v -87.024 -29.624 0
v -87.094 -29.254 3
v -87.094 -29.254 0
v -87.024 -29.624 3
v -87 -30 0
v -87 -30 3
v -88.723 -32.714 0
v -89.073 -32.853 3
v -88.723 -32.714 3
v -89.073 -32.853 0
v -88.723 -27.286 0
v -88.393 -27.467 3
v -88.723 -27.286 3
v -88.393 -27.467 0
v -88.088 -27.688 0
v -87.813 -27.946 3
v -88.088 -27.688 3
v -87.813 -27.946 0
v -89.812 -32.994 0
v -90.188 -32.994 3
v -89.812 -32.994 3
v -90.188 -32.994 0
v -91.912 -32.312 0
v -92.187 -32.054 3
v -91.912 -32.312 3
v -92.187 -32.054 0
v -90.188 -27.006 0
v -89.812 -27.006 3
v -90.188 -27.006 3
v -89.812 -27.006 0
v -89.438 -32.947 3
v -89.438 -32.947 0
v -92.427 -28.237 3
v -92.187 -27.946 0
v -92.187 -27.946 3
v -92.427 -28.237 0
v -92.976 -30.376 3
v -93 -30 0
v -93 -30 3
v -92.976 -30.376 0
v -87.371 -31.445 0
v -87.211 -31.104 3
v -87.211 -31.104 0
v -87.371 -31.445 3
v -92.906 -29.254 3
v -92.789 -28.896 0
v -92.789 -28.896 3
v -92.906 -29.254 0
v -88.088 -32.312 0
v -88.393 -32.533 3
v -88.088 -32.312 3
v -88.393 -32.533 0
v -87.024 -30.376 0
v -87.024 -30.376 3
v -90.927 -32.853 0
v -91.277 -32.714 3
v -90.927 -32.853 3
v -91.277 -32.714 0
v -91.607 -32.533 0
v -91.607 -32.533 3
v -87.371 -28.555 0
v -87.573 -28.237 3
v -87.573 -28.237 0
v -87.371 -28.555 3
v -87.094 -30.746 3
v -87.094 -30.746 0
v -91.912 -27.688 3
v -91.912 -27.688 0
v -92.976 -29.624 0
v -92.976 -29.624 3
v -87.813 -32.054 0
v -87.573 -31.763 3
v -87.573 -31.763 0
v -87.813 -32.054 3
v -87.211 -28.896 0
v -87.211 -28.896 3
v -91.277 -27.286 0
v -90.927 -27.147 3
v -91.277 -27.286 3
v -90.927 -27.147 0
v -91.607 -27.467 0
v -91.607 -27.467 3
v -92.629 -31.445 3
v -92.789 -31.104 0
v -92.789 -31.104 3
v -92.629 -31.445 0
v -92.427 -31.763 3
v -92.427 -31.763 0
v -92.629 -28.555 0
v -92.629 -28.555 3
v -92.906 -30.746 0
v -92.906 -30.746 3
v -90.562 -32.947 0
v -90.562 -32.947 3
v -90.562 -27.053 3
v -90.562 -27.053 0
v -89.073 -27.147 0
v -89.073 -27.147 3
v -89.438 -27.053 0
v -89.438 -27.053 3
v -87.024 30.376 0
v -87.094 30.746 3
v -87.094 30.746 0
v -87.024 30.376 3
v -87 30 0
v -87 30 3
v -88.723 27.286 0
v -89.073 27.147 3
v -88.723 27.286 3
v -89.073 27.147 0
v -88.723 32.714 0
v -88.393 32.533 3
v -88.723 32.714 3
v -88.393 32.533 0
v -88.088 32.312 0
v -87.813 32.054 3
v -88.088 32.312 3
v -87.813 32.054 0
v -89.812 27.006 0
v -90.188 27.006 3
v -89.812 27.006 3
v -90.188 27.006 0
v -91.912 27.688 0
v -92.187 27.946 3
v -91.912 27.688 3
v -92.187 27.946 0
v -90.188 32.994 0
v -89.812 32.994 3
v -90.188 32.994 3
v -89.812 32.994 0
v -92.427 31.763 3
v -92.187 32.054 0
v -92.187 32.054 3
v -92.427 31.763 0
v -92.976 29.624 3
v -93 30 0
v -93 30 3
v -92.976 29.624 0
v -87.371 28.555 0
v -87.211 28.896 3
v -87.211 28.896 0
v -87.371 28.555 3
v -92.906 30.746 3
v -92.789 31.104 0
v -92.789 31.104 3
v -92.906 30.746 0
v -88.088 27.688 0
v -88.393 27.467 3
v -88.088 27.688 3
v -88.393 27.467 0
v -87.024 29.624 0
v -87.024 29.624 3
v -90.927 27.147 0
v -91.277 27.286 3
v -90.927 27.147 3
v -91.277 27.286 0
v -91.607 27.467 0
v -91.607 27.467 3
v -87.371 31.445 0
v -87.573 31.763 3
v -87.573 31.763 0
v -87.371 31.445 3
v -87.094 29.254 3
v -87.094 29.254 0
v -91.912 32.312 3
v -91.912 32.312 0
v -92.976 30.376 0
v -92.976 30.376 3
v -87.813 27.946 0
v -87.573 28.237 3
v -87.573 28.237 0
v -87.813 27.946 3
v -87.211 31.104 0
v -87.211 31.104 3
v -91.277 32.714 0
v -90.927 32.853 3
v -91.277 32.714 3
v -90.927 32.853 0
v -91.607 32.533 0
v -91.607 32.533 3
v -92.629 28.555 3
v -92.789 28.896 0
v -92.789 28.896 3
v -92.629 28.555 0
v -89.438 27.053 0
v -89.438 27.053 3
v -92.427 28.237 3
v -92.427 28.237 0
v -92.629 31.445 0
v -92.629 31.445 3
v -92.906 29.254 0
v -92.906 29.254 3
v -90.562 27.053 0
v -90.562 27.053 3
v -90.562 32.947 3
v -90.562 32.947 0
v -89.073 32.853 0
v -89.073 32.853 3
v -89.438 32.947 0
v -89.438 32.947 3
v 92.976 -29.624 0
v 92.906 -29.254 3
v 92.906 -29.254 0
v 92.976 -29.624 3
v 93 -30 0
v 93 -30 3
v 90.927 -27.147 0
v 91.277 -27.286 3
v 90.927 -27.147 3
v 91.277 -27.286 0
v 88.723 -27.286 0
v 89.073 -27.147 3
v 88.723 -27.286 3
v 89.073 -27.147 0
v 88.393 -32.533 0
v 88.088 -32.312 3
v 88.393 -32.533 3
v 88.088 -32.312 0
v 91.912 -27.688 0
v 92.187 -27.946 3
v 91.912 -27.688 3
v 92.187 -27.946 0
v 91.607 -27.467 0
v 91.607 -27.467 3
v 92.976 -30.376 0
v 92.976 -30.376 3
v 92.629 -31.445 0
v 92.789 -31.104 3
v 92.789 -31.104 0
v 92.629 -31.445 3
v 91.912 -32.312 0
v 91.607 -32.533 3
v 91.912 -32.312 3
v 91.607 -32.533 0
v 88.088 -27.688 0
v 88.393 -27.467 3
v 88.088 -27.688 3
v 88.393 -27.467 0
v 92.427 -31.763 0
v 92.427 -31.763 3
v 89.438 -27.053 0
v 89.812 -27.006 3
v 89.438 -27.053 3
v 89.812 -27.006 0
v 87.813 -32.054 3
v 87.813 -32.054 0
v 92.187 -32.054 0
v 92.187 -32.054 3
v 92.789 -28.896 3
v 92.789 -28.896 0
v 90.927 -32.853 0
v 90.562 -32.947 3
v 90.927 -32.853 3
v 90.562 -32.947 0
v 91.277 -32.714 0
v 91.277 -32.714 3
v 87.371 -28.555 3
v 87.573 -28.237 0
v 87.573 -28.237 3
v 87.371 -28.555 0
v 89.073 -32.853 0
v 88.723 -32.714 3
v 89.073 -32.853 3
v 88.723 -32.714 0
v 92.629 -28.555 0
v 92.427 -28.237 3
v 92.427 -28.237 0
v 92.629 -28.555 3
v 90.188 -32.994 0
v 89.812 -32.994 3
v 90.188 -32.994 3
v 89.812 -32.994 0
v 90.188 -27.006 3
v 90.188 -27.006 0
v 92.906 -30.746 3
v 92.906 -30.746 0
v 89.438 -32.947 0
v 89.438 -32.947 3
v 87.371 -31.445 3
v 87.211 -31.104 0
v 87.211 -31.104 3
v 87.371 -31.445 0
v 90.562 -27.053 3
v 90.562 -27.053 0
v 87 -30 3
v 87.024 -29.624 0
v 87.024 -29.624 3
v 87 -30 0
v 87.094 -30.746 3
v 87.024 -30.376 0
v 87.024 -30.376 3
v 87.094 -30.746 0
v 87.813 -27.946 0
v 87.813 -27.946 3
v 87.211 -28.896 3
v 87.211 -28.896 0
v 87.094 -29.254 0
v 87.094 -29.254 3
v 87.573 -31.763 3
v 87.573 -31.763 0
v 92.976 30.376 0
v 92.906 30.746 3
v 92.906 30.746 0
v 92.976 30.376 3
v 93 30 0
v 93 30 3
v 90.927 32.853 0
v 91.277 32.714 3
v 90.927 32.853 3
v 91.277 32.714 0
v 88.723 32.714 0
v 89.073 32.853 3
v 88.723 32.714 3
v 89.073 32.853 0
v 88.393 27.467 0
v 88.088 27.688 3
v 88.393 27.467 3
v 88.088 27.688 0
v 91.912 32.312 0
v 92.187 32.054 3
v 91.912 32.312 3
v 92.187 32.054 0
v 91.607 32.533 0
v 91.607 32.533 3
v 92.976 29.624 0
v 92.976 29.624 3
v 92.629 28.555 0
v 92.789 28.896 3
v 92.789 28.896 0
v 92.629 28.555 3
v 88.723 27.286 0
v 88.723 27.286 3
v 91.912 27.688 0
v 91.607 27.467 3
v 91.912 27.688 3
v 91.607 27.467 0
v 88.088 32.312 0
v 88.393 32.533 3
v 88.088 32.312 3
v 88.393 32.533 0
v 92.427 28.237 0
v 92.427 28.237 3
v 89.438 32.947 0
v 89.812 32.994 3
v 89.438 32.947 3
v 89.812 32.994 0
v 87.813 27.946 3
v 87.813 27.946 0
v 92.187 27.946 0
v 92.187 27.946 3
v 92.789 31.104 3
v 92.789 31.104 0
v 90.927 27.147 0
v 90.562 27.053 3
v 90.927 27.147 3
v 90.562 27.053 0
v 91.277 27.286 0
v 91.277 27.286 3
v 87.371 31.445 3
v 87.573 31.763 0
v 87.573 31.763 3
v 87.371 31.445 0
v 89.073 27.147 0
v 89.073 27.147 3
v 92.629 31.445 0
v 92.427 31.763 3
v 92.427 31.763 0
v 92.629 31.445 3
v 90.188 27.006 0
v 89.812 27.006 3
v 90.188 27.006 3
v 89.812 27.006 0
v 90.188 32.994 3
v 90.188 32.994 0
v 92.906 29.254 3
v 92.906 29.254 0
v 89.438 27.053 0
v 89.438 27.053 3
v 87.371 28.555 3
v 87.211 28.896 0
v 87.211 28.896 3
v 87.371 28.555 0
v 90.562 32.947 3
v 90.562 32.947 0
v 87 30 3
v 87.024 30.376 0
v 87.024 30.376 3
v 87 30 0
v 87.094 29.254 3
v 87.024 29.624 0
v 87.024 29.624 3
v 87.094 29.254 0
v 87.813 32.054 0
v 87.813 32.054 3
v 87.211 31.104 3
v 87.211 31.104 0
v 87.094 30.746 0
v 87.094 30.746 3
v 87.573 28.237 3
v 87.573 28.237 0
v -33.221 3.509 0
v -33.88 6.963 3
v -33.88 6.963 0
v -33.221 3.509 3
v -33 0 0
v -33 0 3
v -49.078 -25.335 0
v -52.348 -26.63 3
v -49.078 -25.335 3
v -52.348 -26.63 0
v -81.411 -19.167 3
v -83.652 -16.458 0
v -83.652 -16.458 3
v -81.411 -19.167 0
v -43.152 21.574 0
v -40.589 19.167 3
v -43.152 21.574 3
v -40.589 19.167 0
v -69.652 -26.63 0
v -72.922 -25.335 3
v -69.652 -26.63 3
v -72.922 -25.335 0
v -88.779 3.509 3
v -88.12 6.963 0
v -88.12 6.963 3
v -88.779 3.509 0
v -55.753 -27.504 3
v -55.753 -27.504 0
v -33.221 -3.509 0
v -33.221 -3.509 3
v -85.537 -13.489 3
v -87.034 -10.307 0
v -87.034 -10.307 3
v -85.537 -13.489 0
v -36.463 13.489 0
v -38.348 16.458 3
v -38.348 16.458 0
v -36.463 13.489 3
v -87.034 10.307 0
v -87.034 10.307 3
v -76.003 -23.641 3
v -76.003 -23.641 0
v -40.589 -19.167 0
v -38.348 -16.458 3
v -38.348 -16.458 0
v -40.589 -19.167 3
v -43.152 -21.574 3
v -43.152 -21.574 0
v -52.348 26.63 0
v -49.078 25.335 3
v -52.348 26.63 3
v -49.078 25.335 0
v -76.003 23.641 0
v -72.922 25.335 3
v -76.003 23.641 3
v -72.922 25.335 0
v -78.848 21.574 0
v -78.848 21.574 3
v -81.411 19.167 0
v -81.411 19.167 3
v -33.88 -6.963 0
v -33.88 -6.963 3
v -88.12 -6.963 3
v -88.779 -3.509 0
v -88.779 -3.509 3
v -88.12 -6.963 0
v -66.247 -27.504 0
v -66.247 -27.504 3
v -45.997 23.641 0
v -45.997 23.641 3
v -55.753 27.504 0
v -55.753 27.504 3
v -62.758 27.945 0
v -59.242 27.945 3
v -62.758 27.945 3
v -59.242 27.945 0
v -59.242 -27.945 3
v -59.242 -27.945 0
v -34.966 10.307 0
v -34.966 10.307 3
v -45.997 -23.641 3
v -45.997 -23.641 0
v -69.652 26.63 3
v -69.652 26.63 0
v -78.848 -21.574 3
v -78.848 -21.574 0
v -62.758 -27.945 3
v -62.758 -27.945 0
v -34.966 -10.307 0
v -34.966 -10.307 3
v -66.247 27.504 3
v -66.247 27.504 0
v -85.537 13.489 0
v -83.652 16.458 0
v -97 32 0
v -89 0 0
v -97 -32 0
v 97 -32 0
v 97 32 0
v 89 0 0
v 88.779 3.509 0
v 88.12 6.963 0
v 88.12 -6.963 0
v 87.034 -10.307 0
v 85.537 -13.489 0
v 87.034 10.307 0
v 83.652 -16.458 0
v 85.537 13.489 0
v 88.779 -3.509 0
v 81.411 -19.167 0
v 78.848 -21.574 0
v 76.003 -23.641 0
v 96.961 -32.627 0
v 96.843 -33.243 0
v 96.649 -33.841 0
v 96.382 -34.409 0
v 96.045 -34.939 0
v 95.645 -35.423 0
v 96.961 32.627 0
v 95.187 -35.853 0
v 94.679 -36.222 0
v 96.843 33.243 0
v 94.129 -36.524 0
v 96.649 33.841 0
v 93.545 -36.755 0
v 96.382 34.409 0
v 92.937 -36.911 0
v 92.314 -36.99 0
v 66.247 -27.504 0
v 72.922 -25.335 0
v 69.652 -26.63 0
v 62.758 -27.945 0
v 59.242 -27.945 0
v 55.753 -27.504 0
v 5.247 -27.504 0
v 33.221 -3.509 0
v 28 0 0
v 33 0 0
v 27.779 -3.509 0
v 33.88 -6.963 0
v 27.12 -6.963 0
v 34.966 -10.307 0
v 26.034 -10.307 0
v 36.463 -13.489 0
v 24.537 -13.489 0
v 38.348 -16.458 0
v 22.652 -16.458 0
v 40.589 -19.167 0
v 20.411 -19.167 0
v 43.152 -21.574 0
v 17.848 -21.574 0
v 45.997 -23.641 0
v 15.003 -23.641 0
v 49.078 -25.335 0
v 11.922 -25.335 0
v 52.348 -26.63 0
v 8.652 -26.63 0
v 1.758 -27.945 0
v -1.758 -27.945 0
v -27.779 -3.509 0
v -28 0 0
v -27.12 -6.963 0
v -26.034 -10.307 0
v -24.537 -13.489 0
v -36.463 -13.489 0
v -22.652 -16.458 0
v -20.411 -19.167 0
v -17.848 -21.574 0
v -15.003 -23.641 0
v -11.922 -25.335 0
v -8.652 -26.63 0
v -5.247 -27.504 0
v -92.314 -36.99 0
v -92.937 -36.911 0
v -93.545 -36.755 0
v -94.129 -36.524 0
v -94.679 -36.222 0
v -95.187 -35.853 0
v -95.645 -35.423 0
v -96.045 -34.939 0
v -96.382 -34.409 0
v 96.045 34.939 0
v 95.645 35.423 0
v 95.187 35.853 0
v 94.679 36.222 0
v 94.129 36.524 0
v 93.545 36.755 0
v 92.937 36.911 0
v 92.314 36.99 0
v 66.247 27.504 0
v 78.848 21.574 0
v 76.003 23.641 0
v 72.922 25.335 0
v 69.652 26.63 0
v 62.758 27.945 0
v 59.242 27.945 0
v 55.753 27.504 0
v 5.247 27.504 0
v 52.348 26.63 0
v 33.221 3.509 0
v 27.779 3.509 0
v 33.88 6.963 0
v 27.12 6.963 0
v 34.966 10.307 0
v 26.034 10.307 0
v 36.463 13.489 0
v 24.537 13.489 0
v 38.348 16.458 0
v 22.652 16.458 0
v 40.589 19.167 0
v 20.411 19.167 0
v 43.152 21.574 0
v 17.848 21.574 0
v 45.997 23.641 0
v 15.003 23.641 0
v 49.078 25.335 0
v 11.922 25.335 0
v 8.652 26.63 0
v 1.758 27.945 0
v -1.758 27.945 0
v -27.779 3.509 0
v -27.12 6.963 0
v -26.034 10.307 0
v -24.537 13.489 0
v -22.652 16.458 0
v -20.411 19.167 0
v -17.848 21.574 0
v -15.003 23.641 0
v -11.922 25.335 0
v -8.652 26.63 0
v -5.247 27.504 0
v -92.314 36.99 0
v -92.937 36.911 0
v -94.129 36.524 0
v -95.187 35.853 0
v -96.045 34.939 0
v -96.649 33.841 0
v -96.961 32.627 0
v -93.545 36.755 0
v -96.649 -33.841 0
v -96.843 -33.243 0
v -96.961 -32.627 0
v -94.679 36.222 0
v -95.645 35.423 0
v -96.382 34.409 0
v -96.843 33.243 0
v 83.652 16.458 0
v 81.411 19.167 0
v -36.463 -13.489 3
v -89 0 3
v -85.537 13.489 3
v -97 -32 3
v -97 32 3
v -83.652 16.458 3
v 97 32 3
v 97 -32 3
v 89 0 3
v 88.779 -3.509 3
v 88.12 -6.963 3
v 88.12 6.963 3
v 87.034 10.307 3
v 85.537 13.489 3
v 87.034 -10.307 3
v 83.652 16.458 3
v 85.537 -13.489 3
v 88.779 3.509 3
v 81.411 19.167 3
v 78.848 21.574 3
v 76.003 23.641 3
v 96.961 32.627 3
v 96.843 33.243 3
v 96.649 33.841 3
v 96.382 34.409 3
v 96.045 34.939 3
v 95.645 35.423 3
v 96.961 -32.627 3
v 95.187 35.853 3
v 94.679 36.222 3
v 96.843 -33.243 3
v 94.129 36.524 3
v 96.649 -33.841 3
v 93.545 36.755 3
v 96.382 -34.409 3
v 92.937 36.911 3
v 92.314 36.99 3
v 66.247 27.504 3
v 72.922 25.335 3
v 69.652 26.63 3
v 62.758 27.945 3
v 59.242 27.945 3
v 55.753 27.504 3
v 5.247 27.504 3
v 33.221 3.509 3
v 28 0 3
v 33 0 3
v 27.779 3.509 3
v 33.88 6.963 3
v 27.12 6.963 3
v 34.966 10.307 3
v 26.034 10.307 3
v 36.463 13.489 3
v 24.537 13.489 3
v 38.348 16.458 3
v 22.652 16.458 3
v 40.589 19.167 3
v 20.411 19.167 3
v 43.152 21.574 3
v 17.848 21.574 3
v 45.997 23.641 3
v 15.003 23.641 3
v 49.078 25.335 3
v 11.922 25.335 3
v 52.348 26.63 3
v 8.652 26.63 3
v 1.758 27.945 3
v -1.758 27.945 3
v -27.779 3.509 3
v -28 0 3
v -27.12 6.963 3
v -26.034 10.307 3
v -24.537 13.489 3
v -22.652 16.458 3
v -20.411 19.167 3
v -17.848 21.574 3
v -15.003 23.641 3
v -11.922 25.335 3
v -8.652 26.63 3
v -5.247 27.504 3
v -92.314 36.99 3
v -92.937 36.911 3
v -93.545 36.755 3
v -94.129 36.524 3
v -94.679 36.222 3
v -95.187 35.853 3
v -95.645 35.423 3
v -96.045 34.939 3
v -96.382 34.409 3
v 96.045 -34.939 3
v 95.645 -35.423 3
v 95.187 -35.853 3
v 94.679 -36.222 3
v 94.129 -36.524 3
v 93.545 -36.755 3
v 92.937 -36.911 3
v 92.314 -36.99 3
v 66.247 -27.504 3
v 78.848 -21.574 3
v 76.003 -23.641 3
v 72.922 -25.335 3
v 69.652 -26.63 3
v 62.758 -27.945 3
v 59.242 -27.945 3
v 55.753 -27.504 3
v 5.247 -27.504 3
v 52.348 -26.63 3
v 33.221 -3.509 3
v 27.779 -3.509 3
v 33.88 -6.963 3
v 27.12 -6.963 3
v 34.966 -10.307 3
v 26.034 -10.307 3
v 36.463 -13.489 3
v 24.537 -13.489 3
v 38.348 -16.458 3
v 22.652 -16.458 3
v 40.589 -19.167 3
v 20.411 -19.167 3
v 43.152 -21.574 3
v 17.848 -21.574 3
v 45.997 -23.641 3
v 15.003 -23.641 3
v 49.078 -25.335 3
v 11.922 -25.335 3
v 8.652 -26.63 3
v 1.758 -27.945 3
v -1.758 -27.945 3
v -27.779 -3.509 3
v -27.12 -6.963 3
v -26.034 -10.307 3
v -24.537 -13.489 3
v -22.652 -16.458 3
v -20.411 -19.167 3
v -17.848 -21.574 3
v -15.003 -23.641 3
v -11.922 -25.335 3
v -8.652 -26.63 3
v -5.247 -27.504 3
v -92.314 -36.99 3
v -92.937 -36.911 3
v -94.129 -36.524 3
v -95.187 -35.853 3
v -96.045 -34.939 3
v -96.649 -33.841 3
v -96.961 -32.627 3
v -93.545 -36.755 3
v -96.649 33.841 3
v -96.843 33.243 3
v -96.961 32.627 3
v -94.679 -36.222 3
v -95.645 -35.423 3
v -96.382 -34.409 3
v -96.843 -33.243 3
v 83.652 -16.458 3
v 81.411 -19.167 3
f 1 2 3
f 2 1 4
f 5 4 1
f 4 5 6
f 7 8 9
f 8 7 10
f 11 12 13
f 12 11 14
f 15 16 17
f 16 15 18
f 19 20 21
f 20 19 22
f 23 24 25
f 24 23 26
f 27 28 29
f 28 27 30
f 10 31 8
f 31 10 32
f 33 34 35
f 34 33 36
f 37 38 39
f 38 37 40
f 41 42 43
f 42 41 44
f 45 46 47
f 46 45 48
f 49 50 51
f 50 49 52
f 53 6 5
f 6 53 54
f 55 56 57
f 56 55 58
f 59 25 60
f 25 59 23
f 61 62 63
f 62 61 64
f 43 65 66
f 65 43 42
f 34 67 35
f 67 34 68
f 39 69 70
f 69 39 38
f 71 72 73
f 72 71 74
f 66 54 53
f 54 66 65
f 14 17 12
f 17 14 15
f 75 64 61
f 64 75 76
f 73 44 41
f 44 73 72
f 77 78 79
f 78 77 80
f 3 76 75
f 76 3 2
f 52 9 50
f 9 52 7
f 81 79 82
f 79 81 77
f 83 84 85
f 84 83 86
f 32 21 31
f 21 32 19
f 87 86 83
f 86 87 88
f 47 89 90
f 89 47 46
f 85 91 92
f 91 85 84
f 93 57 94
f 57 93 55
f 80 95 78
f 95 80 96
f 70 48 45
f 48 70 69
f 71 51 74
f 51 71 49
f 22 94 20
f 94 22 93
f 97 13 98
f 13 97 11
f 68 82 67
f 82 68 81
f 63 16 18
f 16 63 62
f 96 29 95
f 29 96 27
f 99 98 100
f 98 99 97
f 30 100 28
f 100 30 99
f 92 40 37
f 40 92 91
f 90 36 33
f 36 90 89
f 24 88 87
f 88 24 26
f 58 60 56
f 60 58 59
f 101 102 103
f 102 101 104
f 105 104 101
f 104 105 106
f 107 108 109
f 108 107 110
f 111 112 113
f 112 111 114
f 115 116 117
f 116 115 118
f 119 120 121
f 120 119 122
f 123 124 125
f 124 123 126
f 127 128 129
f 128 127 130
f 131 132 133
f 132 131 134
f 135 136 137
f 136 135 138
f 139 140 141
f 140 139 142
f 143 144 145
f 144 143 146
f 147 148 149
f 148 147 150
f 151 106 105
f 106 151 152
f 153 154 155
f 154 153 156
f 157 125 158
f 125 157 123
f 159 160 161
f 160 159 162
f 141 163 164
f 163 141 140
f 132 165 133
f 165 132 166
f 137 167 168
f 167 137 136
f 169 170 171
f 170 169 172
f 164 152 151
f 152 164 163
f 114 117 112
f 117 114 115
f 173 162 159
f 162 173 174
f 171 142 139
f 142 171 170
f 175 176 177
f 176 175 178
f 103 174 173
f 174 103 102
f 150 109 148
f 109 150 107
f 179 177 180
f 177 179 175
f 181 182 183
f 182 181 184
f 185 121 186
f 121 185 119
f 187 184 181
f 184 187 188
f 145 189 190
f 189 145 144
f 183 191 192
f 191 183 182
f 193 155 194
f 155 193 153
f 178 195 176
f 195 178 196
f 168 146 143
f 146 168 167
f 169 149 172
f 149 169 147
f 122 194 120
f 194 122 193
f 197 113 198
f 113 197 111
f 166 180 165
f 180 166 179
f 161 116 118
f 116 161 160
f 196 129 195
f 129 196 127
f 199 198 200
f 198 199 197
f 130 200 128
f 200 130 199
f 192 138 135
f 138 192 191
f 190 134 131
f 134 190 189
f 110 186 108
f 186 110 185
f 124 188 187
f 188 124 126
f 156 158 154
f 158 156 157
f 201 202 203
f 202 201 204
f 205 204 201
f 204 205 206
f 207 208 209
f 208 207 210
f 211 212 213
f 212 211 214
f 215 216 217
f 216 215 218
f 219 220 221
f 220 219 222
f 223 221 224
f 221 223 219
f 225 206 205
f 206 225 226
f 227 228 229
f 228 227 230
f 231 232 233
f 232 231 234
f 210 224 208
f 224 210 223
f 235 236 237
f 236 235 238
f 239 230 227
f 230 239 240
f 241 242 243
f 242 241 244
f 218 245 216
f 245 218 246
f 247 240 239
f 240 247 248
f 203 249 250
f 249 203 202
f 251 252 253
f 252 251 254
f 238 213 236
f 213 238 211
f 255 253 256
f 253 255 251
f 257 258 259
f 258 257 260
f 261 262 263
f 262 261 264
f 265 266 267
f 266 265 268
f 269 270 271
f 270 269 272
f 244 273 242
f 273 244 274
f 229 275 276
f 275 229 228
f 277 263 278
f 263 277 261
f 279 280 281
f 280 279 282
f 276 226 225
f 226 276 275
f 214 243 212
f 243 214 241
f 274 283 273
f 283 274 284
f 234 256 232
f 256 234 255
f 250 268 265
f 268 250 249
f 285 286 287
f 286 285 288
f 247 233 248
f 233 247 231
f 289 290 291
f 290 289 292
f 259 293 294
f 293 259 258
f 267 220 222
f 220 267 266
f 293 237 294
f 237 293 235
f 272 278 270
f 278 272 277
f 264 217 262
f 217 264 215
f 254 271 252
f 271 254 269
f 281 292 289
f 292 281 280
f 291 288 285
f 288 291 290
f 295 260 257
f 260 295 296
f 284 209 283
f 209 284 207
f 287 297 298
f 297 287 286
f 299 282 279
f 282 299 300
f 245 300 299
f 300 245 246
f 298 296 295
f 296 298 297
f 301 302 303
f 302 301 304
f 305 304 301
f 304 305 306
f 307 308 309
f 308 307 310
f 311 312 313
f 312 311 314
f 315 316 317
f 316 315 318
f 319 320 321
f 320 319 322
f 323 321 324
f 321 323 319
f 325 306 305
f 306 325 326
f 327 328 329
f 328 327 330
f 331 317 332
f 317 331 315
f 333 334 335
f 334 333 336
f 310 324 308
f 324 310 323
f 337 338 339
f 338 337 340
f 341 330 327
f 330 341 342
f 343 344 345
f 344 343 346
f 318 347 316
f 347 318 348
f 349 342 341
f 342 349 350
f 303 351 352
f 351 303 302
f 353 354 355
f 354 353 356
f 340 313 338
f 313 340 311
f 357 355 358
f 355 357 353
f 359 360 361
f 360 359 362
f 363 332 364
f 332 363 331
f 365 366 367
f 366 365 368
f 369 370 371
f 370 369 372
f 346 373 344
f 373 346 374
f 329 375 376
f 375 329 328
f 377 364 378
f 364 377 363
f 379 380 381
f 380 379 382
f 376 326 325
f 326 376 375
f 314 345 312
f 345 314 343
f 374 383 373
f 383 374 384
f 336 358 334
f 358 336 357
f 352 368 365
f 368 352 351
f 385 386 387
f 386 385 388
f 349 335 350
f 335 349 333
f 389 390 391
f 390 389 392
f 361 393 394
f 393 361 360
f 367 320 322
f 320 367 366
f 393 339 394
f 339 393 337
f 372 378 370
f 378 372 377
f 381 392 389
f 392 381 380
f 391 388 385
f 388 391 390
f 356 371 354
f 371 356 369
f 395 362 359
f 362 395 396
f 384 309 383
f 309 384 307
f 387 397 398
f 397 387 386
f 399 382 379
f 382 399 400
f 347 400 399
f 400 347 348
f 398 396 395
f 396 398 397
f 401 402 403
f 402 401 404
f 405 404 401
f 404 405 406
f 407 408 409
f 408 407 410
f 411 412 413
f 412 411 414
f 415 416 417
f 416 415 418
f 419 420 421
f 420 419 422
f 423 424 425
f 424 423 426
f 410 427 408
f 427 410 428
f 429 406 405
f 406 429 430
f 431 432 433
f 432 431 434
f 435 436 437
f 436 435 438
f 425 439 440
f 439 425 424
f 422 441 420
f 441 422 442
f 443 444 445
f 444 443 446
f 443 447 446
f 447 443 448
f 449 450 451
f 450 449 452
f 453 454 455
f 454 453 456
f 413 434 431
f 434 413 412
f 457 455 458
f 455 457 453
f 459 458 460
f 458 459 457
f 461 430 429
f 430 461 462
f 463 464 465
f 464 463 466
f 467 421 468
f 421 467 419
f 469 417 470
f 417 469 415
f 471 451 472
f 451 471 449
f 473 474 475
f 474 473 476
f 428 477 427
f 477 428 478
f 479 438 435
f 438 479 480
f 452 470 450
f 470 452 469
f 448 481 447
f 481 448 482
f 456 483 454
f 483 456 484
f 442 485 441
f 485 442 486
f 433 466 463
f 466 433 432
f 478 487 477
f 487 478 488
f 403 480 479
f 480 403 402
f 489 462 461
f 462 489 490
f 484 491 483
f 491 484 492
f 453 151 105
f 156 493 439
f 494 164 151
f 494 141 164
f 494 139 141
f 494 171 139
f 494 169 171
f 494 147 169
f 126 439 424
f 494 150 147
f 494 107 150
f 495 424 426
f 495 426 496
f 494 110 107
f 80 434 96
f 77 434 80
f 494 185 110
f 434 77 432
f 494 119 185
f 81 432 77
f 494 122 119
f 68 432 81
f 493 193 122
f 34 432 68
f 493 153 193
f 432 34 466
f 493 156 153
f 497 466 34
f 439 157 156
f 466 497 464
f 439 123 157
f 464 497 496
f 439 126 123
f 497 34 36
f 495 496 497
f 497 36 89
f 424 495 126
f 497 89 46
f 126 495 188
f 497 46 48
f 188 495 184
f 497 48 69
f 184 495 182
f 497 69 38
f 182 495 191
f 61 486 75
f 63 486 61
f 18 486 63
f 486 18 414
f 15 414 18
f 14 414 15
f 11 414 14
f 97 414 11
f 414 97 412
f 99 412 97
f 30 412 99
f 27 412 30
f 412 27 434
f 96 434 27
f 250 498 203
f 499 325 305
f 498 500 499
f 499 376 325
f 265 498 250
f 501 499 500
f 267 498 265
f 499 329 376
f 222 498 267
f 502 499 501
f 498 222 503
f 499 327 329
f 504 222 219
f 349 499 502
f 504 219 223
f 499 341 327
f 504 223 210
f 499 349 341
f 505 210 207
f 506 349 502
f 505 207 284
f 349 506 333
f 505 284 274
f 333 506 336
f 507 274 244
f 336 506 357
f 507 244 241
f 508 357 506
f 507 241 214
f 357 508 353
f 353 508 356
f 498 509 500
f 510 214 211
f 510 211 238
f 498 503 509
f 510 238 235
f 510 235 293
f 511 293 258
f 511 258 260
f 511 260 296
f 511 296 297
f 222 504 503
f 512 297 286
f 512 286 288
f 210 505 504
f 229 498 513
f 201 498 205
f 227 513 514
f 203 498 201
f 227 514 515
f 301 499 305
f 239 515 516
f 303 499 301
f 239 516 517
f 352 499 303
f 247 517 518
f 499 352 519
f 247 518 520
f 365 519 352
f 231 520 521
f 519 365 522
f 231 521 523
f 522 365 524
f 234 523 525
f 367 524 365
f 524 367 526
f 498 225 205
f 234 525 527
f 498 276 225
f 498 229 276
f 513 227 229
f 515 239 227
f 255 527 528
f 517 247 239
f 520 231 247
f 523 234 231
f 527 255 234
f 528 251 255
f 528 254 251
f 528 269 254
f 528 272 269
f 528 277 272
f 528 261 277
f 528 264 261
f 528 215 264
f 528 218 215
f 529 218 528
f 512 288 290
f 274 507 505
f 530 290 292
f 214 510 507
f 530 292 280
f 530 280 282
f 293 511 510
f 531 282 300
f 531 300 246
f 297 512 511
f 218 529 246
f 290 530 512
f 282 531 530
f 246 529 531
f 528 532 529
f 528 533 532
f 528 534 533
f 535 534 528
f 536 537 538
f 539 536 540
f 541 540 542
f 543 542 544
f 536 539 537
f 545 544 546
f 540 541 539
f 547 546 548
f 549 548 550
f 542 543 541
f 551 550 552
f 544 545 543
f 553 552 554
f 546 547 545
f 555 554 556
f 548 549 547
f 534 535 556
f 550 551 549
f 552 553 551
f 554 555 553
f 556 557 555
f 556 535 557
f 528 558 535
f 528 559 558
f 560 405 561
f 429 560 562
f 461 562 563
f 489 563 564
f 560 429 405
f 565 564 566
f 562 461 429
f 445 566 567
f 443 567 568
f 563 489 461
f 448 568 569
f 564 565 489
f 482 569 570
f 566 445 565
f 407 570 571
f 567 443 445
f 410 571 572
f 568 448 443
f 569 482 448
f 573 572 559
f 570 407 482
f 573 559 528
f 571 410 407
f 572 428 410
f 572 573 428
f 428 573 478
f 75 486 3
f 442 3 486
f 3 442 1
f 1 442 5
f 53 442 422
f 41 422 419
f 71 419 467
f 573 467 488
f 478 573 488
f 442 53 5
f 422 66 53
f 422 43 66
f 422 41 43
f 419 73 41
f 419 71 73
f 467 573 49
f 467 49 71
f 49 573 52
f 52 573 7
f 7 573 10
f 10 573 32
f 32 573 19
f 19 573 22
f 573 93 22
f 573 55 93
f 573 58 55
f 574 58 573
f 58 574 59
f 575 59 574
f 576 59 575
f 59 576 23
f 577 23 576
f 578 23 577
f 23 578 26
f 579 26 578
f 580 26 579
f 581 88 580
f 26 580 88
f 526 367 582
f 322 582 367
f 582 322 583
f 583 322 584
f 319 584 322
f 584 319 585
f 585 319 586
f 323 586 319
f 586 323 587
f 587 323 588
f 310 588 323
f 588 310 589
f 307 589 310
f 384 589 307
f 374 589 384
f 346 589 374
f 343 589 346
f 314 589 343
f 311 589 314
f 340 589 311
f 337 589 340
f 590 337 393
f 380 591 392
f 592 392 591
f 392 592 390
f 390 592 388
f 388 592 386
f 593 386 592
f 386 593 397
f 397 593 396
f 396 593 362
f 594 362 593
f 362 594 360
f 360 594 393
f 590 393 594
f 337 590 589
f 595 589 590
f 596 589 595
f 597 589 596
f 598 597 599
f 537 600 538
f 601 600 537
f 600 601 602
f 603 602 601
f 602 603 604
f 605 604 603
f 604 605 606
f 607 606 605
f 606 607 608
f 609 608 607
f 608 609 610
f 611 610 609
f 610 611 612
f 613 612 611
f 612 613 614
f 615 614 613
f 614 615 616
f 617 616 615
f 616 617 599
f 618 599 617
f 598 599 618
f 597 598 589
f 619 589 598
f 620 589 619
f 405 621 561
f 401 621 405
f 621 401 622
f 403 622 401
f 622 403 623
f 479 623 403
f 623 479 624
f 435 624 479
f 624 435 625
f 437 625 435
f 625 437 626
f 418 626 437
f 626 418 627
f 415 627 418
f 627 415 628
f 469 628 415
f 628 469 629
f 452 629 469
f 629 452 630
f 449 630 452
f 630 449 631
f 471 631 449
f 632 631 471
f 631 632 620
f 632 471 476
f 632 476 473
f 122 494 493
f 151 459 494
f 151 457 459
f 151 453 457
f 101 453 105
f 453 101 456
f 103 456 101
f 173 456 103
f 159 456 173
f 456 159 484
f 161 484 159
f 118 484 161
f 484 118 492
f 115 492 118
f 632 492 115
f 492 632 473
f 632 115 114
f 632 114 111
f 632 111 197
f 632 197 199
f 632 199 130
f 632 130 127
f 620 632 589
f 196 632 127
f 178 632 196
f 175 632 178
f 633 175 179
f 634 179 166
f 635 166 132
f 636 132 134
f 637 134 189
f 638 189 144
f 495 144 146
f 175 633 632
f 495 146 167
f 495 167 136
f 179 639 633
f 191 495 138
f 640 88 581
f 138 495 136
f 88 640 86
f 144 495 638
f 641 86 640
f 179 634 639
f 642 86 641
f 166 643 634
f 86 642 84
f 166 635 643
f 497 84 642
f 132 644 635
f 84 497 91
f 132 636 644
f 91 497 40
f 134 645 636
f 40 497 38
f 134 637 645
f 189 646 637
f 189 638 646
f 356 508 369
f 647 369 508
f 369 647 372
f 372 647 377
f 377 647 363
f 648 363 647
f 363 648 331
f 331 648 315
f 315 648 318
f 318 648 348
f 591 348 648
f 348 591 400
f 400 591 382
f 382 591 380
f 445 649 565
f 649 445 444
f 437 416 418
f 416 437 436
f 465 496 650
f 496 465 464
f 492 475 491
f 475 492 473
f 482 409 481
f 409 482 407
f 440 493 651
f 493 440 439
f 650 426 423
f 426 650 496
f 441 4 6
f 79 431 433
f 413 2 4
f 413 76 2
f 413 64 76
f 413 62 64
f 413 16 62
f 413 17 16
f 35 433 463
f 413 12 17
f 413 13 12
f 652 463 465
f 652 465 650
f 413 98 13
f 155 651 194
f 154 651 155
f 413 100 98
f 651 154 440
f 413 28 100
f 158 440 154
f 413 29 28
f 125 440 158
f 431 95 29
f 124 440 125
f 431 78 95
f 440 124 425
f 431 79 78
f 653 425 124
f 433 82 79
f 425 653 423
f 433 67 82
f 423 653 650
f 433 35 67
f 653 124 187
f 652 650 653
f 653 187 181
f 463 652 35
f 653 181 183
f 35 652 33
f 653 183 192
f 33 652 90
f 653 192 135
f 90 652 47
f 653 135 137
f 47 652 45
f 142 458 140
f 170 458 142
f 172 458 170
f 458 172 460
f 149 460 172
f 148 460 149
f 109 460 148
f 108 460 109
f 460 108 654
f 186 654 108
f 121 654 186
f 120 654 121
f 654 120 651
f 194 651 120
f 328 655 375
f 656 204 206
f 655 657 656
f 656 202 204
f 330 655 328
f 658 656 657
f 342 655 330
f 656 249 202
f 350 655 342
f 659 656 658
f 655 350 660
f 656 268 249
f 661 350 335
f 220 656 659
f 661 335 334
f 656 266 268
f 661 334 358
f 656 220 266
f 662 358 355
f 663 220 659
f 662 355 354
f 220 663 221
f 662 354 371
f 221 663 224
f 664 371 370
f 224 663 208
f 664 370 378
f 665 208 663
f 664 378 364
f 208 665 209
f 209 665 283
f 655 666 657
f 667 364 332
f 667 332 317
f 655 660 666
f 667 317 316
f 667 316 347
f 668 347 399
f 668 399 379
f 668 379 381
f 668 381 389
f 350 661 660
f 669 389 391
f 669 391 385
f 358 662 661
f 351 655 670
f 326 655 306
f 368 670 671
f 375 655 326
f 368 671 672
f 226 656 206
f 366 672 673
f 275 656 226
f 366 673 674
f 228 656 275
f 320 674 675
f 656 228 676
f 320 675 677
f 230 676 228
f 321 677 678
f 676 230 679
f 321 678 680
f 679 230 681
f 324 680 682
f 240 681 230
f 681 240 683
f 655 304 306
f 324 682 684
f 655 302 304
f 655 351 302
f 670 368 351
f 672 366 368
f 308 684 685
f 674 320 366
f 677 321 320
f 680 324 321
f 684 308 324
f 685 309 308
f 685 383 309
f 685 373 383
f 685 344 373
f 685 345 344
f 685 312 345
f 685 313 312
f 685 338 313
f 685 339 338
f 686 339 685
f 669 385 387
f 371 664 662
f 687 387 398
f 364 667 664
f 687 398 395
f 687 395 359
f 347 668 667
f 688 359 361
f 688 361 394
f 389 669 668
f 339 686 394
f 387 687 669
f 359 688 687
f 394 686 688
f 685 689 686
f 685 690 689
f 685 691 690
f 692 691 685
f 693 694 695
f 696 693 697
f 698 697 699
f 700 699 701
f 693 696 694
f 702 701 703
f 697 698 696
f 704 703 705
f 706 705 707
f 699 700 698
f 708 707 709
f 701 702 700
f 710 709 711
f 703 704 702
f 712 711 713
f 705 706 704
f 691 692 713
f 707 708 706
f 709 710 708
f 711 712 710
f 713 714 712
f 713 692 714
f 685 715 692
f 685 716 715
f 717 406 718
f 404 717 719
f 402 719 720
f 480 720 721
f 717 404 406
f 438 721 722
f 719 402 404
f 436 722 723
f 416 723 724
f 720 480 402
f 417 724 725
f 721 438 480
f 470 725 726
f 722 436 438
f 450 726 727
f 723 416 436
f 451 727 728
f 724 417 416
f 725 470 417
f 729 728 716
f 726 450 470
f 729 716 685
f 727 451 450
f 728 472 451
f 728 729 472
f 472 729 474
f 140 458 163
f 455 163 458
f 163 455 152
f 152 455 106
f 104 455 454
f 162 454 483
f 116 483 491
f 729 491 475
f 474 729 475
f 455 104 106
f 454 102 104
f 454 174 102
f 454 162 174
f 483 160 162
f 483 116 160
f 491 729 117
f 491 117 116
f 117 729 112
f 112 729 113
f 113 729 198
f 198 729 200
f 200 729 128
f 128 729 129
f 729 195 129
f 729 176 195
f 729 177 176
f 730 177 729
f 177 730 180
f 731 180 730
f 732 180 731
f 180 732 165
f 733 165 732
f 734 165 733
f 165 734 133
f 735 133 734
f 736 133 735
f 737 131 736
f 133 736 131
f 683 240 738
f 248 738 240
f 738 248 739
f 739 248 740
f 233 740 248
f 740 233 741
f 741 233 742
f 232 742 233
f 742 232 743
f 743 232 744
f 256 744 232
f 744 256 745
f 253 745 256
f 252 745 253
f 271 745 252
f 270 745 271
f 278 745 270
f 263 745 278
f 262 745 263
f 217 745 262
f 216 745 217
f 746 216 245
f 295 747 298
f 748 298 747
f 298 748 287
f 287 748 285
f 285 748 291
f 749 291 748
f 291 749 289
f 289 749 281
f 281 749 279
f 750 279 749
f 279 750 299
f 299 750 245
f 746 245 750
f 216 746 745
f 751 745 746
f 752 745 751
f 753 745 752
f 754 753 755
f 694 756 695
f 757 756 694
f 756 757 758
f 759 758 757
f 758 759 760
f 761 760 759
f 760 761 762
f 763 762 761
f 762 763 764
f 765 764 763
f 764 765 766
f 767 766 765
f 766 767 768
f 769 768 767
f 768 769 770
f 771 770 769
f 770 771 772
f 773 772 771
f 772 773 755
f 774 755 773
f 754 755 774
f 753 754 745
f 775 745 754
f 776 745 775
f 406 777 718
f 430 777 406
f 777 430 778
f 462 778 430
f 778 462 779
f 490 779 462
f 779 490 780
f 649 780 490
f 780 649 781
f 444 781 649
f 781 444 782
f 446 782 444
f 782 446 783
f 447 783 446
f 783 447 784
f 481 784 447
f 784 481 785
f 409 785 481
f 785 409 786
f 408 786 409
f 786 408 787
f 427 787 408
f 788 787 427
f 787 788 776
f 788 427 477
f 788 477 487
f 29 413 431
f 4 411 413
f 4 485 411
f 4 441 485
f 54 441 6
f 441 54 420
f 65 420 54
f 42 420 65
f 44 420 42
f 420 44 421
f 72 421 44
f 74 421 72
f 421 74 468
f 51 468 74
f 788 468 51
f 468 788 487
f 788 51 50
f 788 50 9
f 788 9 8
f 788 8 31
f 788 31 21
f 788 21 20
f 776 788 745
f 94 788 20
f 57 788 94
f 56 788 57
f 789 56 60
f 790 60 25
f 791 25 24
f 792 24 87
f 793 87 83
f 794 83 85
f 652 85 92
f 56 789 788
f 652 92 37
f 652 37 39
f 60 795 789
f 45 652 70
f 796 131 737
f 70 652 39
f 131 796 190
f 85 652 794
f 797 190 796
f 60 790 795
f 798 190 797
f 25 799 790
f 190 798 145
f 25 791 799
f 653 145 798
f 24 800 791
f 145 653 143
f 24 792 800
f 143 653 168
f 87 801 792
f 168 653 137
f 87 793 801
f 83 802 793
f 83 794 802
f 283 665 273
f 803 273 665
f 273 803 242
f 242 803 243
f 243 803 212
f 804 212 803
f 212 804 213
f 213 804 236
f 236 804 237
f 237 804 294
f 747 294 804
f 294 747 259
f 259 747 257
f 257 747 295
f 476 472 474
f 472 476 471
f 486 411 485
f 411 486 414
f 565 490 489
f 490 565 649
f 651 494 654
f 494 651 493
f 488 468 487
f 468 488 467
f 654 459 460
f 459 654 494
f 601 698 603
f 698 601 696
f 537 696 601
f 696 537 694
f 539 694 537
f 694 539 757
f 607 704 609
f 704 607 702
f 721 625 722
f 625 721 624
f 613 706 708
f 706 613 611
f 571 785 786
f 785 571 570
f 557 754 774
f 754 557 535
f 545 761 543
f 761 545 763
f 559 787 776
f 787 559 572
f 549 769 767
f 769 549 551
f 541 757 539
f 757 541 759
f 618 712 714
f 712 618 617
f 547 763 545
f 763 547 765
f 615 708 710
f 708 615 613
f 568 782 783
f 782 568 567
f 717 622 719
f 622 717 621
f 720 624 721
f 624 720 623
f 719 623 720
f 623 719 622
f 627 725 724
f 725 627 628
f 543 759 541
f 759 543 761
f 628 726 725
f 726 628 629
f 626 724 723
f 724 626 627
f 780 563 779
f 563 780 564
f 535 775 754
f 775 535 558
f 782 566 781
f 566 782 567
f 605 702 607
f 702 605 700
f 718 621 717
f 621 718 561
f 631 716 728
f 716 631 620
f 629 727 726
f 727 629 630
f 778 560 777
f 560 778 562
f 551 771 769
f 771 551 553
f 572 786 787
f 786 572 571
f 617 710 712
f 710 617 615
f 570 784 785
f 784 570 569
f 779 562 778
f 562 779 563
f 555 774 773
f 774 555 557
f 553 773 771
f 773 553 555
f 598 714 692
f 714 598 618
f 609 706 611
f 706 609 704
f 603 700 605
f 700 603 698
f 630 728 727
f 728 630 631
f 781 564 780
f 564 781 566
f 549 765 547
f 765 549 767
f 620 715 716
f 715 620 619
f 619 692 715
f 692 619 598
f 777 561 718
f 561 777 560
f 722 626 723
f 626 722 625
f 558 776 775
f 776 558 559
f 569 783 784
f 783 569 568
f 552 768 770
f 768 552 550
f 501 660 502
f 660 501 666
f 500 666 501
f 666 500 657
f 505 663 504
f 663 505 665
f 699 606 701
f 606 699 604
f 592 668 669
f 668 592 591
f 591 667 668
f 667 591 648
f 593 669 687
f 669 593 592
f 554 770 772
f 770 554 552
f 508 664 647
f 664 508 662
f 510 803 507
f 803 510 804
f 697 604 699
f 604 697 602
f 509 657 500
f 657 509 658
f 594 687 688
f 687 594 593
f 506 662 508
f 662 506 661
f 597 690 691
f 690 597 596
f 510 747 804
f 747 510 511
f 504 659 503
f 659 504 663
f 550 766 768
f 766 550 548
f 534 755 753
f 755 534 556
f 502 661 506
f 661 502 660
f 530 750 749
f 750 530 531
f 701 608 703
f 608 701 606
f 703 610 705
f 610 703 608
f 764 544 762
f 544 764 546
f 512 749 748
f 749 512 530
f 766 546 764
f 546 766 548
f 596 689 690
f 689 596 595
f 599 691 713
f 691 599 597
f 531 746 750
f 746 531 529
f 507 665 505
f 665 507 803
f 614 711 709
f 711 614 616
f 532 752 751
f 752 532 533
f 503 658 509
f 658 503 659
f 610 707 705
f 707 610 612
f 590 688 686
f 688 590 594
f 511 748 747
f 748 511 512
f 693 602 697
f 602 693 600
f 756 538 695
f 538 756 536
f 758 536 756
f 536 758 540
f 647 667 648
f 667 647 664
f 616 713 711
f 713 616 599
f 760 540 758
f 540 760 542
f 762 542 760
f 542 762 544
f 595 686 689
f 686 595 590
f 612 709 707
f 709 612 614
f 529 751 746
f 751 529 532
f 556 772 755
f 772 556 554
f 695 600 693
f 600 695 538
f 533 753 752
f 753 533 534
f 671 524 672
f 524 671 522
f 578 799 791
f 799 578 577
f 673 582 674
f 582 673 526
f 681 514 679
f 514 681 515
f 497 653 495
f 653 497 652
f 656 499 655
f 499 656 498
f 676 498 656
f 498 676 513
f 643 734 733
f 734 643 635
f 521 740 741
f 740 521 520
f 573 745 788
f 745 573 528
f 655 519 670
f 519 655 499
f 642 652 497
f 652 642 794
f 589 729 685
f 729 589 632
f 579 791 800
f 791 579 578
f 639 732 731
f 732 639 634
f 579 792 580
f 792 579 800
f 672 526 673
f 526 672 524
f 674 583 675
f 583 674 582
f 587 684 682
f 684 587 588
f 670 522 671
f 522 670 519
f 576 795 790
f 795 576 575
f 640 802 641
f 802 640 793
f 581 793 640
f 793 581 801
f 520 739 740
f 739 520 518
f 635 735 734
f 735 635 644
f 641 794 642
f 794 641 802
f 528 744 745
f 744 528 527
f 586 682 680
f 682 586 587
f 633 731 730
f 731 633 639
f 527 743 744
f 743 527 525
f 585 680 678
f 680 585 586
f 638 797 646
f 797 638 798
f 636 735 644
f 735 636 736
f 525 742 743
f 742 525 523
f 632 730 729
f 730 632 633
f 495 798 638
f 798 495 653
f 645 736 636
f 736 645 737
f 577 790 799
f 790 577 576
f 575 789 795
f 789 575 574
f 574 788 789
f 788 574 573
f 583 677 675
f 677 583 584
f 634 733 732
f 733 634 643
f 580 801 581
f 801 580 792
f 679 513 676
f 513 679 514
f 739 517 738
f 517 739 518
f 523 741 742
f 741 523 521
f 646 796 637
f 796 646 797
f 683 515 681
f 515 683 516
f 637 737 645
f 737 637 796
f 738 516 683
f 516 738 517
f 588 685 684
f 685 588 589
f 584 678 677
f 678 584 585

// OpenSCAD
$fn = 50;


difference() {
	union() {
		hull() {
			translate(v = [-92.0000000000, 32.0000000000, 0]) {
				cylinder(h = 3, r = 5);
			}
			translate(v = [92.0000000000, 32.0000000000, 0]) {
				cylinder(h = 3, r = 5);
			}
			translate(v = [-92.0000000000, -32.0000000000, 0]) {
				cylinder(h = 3, r = 5);
			}
			translate(v = [92.0000000000, -32.0000000000, 0]) {
				cylinder(h = 3, r = 5);
			}
		}
	}
	union() {
		#translate(v = [-90.0000000000, -30.0000000000, -100.0000000000]) {
			cylinder(h = 200, r = 3.0000000000);
		}
		#translate(v = [-90.0000000000, 30.0000000000, -100.0000000000]) {
			cylinder(h = 200, r = 3.0000000000);
		}
		#translate(v = [90.0000000000, -30.0000000000, -100.0000000000]) {
			cylinder(h = 200, r = 3.0000000000);
		}
		#translate(v = [90.0000000000, 30.0000000000, -100.0000000000]) {
			cylinder(h = 200, r = 3.0000000000);
		}
		#translate(v = [-61.0000000000, 0, 0]) {
			cylinder(h = 3, r = 28.0000000000);
		}
		#cylinder(h = 3, r = 28.0000000000);
		#translate(v = [61.0000000000, 0, 0]) {
			cylinder(h = 3, r = 28.0000000000);
		}
	}
}
